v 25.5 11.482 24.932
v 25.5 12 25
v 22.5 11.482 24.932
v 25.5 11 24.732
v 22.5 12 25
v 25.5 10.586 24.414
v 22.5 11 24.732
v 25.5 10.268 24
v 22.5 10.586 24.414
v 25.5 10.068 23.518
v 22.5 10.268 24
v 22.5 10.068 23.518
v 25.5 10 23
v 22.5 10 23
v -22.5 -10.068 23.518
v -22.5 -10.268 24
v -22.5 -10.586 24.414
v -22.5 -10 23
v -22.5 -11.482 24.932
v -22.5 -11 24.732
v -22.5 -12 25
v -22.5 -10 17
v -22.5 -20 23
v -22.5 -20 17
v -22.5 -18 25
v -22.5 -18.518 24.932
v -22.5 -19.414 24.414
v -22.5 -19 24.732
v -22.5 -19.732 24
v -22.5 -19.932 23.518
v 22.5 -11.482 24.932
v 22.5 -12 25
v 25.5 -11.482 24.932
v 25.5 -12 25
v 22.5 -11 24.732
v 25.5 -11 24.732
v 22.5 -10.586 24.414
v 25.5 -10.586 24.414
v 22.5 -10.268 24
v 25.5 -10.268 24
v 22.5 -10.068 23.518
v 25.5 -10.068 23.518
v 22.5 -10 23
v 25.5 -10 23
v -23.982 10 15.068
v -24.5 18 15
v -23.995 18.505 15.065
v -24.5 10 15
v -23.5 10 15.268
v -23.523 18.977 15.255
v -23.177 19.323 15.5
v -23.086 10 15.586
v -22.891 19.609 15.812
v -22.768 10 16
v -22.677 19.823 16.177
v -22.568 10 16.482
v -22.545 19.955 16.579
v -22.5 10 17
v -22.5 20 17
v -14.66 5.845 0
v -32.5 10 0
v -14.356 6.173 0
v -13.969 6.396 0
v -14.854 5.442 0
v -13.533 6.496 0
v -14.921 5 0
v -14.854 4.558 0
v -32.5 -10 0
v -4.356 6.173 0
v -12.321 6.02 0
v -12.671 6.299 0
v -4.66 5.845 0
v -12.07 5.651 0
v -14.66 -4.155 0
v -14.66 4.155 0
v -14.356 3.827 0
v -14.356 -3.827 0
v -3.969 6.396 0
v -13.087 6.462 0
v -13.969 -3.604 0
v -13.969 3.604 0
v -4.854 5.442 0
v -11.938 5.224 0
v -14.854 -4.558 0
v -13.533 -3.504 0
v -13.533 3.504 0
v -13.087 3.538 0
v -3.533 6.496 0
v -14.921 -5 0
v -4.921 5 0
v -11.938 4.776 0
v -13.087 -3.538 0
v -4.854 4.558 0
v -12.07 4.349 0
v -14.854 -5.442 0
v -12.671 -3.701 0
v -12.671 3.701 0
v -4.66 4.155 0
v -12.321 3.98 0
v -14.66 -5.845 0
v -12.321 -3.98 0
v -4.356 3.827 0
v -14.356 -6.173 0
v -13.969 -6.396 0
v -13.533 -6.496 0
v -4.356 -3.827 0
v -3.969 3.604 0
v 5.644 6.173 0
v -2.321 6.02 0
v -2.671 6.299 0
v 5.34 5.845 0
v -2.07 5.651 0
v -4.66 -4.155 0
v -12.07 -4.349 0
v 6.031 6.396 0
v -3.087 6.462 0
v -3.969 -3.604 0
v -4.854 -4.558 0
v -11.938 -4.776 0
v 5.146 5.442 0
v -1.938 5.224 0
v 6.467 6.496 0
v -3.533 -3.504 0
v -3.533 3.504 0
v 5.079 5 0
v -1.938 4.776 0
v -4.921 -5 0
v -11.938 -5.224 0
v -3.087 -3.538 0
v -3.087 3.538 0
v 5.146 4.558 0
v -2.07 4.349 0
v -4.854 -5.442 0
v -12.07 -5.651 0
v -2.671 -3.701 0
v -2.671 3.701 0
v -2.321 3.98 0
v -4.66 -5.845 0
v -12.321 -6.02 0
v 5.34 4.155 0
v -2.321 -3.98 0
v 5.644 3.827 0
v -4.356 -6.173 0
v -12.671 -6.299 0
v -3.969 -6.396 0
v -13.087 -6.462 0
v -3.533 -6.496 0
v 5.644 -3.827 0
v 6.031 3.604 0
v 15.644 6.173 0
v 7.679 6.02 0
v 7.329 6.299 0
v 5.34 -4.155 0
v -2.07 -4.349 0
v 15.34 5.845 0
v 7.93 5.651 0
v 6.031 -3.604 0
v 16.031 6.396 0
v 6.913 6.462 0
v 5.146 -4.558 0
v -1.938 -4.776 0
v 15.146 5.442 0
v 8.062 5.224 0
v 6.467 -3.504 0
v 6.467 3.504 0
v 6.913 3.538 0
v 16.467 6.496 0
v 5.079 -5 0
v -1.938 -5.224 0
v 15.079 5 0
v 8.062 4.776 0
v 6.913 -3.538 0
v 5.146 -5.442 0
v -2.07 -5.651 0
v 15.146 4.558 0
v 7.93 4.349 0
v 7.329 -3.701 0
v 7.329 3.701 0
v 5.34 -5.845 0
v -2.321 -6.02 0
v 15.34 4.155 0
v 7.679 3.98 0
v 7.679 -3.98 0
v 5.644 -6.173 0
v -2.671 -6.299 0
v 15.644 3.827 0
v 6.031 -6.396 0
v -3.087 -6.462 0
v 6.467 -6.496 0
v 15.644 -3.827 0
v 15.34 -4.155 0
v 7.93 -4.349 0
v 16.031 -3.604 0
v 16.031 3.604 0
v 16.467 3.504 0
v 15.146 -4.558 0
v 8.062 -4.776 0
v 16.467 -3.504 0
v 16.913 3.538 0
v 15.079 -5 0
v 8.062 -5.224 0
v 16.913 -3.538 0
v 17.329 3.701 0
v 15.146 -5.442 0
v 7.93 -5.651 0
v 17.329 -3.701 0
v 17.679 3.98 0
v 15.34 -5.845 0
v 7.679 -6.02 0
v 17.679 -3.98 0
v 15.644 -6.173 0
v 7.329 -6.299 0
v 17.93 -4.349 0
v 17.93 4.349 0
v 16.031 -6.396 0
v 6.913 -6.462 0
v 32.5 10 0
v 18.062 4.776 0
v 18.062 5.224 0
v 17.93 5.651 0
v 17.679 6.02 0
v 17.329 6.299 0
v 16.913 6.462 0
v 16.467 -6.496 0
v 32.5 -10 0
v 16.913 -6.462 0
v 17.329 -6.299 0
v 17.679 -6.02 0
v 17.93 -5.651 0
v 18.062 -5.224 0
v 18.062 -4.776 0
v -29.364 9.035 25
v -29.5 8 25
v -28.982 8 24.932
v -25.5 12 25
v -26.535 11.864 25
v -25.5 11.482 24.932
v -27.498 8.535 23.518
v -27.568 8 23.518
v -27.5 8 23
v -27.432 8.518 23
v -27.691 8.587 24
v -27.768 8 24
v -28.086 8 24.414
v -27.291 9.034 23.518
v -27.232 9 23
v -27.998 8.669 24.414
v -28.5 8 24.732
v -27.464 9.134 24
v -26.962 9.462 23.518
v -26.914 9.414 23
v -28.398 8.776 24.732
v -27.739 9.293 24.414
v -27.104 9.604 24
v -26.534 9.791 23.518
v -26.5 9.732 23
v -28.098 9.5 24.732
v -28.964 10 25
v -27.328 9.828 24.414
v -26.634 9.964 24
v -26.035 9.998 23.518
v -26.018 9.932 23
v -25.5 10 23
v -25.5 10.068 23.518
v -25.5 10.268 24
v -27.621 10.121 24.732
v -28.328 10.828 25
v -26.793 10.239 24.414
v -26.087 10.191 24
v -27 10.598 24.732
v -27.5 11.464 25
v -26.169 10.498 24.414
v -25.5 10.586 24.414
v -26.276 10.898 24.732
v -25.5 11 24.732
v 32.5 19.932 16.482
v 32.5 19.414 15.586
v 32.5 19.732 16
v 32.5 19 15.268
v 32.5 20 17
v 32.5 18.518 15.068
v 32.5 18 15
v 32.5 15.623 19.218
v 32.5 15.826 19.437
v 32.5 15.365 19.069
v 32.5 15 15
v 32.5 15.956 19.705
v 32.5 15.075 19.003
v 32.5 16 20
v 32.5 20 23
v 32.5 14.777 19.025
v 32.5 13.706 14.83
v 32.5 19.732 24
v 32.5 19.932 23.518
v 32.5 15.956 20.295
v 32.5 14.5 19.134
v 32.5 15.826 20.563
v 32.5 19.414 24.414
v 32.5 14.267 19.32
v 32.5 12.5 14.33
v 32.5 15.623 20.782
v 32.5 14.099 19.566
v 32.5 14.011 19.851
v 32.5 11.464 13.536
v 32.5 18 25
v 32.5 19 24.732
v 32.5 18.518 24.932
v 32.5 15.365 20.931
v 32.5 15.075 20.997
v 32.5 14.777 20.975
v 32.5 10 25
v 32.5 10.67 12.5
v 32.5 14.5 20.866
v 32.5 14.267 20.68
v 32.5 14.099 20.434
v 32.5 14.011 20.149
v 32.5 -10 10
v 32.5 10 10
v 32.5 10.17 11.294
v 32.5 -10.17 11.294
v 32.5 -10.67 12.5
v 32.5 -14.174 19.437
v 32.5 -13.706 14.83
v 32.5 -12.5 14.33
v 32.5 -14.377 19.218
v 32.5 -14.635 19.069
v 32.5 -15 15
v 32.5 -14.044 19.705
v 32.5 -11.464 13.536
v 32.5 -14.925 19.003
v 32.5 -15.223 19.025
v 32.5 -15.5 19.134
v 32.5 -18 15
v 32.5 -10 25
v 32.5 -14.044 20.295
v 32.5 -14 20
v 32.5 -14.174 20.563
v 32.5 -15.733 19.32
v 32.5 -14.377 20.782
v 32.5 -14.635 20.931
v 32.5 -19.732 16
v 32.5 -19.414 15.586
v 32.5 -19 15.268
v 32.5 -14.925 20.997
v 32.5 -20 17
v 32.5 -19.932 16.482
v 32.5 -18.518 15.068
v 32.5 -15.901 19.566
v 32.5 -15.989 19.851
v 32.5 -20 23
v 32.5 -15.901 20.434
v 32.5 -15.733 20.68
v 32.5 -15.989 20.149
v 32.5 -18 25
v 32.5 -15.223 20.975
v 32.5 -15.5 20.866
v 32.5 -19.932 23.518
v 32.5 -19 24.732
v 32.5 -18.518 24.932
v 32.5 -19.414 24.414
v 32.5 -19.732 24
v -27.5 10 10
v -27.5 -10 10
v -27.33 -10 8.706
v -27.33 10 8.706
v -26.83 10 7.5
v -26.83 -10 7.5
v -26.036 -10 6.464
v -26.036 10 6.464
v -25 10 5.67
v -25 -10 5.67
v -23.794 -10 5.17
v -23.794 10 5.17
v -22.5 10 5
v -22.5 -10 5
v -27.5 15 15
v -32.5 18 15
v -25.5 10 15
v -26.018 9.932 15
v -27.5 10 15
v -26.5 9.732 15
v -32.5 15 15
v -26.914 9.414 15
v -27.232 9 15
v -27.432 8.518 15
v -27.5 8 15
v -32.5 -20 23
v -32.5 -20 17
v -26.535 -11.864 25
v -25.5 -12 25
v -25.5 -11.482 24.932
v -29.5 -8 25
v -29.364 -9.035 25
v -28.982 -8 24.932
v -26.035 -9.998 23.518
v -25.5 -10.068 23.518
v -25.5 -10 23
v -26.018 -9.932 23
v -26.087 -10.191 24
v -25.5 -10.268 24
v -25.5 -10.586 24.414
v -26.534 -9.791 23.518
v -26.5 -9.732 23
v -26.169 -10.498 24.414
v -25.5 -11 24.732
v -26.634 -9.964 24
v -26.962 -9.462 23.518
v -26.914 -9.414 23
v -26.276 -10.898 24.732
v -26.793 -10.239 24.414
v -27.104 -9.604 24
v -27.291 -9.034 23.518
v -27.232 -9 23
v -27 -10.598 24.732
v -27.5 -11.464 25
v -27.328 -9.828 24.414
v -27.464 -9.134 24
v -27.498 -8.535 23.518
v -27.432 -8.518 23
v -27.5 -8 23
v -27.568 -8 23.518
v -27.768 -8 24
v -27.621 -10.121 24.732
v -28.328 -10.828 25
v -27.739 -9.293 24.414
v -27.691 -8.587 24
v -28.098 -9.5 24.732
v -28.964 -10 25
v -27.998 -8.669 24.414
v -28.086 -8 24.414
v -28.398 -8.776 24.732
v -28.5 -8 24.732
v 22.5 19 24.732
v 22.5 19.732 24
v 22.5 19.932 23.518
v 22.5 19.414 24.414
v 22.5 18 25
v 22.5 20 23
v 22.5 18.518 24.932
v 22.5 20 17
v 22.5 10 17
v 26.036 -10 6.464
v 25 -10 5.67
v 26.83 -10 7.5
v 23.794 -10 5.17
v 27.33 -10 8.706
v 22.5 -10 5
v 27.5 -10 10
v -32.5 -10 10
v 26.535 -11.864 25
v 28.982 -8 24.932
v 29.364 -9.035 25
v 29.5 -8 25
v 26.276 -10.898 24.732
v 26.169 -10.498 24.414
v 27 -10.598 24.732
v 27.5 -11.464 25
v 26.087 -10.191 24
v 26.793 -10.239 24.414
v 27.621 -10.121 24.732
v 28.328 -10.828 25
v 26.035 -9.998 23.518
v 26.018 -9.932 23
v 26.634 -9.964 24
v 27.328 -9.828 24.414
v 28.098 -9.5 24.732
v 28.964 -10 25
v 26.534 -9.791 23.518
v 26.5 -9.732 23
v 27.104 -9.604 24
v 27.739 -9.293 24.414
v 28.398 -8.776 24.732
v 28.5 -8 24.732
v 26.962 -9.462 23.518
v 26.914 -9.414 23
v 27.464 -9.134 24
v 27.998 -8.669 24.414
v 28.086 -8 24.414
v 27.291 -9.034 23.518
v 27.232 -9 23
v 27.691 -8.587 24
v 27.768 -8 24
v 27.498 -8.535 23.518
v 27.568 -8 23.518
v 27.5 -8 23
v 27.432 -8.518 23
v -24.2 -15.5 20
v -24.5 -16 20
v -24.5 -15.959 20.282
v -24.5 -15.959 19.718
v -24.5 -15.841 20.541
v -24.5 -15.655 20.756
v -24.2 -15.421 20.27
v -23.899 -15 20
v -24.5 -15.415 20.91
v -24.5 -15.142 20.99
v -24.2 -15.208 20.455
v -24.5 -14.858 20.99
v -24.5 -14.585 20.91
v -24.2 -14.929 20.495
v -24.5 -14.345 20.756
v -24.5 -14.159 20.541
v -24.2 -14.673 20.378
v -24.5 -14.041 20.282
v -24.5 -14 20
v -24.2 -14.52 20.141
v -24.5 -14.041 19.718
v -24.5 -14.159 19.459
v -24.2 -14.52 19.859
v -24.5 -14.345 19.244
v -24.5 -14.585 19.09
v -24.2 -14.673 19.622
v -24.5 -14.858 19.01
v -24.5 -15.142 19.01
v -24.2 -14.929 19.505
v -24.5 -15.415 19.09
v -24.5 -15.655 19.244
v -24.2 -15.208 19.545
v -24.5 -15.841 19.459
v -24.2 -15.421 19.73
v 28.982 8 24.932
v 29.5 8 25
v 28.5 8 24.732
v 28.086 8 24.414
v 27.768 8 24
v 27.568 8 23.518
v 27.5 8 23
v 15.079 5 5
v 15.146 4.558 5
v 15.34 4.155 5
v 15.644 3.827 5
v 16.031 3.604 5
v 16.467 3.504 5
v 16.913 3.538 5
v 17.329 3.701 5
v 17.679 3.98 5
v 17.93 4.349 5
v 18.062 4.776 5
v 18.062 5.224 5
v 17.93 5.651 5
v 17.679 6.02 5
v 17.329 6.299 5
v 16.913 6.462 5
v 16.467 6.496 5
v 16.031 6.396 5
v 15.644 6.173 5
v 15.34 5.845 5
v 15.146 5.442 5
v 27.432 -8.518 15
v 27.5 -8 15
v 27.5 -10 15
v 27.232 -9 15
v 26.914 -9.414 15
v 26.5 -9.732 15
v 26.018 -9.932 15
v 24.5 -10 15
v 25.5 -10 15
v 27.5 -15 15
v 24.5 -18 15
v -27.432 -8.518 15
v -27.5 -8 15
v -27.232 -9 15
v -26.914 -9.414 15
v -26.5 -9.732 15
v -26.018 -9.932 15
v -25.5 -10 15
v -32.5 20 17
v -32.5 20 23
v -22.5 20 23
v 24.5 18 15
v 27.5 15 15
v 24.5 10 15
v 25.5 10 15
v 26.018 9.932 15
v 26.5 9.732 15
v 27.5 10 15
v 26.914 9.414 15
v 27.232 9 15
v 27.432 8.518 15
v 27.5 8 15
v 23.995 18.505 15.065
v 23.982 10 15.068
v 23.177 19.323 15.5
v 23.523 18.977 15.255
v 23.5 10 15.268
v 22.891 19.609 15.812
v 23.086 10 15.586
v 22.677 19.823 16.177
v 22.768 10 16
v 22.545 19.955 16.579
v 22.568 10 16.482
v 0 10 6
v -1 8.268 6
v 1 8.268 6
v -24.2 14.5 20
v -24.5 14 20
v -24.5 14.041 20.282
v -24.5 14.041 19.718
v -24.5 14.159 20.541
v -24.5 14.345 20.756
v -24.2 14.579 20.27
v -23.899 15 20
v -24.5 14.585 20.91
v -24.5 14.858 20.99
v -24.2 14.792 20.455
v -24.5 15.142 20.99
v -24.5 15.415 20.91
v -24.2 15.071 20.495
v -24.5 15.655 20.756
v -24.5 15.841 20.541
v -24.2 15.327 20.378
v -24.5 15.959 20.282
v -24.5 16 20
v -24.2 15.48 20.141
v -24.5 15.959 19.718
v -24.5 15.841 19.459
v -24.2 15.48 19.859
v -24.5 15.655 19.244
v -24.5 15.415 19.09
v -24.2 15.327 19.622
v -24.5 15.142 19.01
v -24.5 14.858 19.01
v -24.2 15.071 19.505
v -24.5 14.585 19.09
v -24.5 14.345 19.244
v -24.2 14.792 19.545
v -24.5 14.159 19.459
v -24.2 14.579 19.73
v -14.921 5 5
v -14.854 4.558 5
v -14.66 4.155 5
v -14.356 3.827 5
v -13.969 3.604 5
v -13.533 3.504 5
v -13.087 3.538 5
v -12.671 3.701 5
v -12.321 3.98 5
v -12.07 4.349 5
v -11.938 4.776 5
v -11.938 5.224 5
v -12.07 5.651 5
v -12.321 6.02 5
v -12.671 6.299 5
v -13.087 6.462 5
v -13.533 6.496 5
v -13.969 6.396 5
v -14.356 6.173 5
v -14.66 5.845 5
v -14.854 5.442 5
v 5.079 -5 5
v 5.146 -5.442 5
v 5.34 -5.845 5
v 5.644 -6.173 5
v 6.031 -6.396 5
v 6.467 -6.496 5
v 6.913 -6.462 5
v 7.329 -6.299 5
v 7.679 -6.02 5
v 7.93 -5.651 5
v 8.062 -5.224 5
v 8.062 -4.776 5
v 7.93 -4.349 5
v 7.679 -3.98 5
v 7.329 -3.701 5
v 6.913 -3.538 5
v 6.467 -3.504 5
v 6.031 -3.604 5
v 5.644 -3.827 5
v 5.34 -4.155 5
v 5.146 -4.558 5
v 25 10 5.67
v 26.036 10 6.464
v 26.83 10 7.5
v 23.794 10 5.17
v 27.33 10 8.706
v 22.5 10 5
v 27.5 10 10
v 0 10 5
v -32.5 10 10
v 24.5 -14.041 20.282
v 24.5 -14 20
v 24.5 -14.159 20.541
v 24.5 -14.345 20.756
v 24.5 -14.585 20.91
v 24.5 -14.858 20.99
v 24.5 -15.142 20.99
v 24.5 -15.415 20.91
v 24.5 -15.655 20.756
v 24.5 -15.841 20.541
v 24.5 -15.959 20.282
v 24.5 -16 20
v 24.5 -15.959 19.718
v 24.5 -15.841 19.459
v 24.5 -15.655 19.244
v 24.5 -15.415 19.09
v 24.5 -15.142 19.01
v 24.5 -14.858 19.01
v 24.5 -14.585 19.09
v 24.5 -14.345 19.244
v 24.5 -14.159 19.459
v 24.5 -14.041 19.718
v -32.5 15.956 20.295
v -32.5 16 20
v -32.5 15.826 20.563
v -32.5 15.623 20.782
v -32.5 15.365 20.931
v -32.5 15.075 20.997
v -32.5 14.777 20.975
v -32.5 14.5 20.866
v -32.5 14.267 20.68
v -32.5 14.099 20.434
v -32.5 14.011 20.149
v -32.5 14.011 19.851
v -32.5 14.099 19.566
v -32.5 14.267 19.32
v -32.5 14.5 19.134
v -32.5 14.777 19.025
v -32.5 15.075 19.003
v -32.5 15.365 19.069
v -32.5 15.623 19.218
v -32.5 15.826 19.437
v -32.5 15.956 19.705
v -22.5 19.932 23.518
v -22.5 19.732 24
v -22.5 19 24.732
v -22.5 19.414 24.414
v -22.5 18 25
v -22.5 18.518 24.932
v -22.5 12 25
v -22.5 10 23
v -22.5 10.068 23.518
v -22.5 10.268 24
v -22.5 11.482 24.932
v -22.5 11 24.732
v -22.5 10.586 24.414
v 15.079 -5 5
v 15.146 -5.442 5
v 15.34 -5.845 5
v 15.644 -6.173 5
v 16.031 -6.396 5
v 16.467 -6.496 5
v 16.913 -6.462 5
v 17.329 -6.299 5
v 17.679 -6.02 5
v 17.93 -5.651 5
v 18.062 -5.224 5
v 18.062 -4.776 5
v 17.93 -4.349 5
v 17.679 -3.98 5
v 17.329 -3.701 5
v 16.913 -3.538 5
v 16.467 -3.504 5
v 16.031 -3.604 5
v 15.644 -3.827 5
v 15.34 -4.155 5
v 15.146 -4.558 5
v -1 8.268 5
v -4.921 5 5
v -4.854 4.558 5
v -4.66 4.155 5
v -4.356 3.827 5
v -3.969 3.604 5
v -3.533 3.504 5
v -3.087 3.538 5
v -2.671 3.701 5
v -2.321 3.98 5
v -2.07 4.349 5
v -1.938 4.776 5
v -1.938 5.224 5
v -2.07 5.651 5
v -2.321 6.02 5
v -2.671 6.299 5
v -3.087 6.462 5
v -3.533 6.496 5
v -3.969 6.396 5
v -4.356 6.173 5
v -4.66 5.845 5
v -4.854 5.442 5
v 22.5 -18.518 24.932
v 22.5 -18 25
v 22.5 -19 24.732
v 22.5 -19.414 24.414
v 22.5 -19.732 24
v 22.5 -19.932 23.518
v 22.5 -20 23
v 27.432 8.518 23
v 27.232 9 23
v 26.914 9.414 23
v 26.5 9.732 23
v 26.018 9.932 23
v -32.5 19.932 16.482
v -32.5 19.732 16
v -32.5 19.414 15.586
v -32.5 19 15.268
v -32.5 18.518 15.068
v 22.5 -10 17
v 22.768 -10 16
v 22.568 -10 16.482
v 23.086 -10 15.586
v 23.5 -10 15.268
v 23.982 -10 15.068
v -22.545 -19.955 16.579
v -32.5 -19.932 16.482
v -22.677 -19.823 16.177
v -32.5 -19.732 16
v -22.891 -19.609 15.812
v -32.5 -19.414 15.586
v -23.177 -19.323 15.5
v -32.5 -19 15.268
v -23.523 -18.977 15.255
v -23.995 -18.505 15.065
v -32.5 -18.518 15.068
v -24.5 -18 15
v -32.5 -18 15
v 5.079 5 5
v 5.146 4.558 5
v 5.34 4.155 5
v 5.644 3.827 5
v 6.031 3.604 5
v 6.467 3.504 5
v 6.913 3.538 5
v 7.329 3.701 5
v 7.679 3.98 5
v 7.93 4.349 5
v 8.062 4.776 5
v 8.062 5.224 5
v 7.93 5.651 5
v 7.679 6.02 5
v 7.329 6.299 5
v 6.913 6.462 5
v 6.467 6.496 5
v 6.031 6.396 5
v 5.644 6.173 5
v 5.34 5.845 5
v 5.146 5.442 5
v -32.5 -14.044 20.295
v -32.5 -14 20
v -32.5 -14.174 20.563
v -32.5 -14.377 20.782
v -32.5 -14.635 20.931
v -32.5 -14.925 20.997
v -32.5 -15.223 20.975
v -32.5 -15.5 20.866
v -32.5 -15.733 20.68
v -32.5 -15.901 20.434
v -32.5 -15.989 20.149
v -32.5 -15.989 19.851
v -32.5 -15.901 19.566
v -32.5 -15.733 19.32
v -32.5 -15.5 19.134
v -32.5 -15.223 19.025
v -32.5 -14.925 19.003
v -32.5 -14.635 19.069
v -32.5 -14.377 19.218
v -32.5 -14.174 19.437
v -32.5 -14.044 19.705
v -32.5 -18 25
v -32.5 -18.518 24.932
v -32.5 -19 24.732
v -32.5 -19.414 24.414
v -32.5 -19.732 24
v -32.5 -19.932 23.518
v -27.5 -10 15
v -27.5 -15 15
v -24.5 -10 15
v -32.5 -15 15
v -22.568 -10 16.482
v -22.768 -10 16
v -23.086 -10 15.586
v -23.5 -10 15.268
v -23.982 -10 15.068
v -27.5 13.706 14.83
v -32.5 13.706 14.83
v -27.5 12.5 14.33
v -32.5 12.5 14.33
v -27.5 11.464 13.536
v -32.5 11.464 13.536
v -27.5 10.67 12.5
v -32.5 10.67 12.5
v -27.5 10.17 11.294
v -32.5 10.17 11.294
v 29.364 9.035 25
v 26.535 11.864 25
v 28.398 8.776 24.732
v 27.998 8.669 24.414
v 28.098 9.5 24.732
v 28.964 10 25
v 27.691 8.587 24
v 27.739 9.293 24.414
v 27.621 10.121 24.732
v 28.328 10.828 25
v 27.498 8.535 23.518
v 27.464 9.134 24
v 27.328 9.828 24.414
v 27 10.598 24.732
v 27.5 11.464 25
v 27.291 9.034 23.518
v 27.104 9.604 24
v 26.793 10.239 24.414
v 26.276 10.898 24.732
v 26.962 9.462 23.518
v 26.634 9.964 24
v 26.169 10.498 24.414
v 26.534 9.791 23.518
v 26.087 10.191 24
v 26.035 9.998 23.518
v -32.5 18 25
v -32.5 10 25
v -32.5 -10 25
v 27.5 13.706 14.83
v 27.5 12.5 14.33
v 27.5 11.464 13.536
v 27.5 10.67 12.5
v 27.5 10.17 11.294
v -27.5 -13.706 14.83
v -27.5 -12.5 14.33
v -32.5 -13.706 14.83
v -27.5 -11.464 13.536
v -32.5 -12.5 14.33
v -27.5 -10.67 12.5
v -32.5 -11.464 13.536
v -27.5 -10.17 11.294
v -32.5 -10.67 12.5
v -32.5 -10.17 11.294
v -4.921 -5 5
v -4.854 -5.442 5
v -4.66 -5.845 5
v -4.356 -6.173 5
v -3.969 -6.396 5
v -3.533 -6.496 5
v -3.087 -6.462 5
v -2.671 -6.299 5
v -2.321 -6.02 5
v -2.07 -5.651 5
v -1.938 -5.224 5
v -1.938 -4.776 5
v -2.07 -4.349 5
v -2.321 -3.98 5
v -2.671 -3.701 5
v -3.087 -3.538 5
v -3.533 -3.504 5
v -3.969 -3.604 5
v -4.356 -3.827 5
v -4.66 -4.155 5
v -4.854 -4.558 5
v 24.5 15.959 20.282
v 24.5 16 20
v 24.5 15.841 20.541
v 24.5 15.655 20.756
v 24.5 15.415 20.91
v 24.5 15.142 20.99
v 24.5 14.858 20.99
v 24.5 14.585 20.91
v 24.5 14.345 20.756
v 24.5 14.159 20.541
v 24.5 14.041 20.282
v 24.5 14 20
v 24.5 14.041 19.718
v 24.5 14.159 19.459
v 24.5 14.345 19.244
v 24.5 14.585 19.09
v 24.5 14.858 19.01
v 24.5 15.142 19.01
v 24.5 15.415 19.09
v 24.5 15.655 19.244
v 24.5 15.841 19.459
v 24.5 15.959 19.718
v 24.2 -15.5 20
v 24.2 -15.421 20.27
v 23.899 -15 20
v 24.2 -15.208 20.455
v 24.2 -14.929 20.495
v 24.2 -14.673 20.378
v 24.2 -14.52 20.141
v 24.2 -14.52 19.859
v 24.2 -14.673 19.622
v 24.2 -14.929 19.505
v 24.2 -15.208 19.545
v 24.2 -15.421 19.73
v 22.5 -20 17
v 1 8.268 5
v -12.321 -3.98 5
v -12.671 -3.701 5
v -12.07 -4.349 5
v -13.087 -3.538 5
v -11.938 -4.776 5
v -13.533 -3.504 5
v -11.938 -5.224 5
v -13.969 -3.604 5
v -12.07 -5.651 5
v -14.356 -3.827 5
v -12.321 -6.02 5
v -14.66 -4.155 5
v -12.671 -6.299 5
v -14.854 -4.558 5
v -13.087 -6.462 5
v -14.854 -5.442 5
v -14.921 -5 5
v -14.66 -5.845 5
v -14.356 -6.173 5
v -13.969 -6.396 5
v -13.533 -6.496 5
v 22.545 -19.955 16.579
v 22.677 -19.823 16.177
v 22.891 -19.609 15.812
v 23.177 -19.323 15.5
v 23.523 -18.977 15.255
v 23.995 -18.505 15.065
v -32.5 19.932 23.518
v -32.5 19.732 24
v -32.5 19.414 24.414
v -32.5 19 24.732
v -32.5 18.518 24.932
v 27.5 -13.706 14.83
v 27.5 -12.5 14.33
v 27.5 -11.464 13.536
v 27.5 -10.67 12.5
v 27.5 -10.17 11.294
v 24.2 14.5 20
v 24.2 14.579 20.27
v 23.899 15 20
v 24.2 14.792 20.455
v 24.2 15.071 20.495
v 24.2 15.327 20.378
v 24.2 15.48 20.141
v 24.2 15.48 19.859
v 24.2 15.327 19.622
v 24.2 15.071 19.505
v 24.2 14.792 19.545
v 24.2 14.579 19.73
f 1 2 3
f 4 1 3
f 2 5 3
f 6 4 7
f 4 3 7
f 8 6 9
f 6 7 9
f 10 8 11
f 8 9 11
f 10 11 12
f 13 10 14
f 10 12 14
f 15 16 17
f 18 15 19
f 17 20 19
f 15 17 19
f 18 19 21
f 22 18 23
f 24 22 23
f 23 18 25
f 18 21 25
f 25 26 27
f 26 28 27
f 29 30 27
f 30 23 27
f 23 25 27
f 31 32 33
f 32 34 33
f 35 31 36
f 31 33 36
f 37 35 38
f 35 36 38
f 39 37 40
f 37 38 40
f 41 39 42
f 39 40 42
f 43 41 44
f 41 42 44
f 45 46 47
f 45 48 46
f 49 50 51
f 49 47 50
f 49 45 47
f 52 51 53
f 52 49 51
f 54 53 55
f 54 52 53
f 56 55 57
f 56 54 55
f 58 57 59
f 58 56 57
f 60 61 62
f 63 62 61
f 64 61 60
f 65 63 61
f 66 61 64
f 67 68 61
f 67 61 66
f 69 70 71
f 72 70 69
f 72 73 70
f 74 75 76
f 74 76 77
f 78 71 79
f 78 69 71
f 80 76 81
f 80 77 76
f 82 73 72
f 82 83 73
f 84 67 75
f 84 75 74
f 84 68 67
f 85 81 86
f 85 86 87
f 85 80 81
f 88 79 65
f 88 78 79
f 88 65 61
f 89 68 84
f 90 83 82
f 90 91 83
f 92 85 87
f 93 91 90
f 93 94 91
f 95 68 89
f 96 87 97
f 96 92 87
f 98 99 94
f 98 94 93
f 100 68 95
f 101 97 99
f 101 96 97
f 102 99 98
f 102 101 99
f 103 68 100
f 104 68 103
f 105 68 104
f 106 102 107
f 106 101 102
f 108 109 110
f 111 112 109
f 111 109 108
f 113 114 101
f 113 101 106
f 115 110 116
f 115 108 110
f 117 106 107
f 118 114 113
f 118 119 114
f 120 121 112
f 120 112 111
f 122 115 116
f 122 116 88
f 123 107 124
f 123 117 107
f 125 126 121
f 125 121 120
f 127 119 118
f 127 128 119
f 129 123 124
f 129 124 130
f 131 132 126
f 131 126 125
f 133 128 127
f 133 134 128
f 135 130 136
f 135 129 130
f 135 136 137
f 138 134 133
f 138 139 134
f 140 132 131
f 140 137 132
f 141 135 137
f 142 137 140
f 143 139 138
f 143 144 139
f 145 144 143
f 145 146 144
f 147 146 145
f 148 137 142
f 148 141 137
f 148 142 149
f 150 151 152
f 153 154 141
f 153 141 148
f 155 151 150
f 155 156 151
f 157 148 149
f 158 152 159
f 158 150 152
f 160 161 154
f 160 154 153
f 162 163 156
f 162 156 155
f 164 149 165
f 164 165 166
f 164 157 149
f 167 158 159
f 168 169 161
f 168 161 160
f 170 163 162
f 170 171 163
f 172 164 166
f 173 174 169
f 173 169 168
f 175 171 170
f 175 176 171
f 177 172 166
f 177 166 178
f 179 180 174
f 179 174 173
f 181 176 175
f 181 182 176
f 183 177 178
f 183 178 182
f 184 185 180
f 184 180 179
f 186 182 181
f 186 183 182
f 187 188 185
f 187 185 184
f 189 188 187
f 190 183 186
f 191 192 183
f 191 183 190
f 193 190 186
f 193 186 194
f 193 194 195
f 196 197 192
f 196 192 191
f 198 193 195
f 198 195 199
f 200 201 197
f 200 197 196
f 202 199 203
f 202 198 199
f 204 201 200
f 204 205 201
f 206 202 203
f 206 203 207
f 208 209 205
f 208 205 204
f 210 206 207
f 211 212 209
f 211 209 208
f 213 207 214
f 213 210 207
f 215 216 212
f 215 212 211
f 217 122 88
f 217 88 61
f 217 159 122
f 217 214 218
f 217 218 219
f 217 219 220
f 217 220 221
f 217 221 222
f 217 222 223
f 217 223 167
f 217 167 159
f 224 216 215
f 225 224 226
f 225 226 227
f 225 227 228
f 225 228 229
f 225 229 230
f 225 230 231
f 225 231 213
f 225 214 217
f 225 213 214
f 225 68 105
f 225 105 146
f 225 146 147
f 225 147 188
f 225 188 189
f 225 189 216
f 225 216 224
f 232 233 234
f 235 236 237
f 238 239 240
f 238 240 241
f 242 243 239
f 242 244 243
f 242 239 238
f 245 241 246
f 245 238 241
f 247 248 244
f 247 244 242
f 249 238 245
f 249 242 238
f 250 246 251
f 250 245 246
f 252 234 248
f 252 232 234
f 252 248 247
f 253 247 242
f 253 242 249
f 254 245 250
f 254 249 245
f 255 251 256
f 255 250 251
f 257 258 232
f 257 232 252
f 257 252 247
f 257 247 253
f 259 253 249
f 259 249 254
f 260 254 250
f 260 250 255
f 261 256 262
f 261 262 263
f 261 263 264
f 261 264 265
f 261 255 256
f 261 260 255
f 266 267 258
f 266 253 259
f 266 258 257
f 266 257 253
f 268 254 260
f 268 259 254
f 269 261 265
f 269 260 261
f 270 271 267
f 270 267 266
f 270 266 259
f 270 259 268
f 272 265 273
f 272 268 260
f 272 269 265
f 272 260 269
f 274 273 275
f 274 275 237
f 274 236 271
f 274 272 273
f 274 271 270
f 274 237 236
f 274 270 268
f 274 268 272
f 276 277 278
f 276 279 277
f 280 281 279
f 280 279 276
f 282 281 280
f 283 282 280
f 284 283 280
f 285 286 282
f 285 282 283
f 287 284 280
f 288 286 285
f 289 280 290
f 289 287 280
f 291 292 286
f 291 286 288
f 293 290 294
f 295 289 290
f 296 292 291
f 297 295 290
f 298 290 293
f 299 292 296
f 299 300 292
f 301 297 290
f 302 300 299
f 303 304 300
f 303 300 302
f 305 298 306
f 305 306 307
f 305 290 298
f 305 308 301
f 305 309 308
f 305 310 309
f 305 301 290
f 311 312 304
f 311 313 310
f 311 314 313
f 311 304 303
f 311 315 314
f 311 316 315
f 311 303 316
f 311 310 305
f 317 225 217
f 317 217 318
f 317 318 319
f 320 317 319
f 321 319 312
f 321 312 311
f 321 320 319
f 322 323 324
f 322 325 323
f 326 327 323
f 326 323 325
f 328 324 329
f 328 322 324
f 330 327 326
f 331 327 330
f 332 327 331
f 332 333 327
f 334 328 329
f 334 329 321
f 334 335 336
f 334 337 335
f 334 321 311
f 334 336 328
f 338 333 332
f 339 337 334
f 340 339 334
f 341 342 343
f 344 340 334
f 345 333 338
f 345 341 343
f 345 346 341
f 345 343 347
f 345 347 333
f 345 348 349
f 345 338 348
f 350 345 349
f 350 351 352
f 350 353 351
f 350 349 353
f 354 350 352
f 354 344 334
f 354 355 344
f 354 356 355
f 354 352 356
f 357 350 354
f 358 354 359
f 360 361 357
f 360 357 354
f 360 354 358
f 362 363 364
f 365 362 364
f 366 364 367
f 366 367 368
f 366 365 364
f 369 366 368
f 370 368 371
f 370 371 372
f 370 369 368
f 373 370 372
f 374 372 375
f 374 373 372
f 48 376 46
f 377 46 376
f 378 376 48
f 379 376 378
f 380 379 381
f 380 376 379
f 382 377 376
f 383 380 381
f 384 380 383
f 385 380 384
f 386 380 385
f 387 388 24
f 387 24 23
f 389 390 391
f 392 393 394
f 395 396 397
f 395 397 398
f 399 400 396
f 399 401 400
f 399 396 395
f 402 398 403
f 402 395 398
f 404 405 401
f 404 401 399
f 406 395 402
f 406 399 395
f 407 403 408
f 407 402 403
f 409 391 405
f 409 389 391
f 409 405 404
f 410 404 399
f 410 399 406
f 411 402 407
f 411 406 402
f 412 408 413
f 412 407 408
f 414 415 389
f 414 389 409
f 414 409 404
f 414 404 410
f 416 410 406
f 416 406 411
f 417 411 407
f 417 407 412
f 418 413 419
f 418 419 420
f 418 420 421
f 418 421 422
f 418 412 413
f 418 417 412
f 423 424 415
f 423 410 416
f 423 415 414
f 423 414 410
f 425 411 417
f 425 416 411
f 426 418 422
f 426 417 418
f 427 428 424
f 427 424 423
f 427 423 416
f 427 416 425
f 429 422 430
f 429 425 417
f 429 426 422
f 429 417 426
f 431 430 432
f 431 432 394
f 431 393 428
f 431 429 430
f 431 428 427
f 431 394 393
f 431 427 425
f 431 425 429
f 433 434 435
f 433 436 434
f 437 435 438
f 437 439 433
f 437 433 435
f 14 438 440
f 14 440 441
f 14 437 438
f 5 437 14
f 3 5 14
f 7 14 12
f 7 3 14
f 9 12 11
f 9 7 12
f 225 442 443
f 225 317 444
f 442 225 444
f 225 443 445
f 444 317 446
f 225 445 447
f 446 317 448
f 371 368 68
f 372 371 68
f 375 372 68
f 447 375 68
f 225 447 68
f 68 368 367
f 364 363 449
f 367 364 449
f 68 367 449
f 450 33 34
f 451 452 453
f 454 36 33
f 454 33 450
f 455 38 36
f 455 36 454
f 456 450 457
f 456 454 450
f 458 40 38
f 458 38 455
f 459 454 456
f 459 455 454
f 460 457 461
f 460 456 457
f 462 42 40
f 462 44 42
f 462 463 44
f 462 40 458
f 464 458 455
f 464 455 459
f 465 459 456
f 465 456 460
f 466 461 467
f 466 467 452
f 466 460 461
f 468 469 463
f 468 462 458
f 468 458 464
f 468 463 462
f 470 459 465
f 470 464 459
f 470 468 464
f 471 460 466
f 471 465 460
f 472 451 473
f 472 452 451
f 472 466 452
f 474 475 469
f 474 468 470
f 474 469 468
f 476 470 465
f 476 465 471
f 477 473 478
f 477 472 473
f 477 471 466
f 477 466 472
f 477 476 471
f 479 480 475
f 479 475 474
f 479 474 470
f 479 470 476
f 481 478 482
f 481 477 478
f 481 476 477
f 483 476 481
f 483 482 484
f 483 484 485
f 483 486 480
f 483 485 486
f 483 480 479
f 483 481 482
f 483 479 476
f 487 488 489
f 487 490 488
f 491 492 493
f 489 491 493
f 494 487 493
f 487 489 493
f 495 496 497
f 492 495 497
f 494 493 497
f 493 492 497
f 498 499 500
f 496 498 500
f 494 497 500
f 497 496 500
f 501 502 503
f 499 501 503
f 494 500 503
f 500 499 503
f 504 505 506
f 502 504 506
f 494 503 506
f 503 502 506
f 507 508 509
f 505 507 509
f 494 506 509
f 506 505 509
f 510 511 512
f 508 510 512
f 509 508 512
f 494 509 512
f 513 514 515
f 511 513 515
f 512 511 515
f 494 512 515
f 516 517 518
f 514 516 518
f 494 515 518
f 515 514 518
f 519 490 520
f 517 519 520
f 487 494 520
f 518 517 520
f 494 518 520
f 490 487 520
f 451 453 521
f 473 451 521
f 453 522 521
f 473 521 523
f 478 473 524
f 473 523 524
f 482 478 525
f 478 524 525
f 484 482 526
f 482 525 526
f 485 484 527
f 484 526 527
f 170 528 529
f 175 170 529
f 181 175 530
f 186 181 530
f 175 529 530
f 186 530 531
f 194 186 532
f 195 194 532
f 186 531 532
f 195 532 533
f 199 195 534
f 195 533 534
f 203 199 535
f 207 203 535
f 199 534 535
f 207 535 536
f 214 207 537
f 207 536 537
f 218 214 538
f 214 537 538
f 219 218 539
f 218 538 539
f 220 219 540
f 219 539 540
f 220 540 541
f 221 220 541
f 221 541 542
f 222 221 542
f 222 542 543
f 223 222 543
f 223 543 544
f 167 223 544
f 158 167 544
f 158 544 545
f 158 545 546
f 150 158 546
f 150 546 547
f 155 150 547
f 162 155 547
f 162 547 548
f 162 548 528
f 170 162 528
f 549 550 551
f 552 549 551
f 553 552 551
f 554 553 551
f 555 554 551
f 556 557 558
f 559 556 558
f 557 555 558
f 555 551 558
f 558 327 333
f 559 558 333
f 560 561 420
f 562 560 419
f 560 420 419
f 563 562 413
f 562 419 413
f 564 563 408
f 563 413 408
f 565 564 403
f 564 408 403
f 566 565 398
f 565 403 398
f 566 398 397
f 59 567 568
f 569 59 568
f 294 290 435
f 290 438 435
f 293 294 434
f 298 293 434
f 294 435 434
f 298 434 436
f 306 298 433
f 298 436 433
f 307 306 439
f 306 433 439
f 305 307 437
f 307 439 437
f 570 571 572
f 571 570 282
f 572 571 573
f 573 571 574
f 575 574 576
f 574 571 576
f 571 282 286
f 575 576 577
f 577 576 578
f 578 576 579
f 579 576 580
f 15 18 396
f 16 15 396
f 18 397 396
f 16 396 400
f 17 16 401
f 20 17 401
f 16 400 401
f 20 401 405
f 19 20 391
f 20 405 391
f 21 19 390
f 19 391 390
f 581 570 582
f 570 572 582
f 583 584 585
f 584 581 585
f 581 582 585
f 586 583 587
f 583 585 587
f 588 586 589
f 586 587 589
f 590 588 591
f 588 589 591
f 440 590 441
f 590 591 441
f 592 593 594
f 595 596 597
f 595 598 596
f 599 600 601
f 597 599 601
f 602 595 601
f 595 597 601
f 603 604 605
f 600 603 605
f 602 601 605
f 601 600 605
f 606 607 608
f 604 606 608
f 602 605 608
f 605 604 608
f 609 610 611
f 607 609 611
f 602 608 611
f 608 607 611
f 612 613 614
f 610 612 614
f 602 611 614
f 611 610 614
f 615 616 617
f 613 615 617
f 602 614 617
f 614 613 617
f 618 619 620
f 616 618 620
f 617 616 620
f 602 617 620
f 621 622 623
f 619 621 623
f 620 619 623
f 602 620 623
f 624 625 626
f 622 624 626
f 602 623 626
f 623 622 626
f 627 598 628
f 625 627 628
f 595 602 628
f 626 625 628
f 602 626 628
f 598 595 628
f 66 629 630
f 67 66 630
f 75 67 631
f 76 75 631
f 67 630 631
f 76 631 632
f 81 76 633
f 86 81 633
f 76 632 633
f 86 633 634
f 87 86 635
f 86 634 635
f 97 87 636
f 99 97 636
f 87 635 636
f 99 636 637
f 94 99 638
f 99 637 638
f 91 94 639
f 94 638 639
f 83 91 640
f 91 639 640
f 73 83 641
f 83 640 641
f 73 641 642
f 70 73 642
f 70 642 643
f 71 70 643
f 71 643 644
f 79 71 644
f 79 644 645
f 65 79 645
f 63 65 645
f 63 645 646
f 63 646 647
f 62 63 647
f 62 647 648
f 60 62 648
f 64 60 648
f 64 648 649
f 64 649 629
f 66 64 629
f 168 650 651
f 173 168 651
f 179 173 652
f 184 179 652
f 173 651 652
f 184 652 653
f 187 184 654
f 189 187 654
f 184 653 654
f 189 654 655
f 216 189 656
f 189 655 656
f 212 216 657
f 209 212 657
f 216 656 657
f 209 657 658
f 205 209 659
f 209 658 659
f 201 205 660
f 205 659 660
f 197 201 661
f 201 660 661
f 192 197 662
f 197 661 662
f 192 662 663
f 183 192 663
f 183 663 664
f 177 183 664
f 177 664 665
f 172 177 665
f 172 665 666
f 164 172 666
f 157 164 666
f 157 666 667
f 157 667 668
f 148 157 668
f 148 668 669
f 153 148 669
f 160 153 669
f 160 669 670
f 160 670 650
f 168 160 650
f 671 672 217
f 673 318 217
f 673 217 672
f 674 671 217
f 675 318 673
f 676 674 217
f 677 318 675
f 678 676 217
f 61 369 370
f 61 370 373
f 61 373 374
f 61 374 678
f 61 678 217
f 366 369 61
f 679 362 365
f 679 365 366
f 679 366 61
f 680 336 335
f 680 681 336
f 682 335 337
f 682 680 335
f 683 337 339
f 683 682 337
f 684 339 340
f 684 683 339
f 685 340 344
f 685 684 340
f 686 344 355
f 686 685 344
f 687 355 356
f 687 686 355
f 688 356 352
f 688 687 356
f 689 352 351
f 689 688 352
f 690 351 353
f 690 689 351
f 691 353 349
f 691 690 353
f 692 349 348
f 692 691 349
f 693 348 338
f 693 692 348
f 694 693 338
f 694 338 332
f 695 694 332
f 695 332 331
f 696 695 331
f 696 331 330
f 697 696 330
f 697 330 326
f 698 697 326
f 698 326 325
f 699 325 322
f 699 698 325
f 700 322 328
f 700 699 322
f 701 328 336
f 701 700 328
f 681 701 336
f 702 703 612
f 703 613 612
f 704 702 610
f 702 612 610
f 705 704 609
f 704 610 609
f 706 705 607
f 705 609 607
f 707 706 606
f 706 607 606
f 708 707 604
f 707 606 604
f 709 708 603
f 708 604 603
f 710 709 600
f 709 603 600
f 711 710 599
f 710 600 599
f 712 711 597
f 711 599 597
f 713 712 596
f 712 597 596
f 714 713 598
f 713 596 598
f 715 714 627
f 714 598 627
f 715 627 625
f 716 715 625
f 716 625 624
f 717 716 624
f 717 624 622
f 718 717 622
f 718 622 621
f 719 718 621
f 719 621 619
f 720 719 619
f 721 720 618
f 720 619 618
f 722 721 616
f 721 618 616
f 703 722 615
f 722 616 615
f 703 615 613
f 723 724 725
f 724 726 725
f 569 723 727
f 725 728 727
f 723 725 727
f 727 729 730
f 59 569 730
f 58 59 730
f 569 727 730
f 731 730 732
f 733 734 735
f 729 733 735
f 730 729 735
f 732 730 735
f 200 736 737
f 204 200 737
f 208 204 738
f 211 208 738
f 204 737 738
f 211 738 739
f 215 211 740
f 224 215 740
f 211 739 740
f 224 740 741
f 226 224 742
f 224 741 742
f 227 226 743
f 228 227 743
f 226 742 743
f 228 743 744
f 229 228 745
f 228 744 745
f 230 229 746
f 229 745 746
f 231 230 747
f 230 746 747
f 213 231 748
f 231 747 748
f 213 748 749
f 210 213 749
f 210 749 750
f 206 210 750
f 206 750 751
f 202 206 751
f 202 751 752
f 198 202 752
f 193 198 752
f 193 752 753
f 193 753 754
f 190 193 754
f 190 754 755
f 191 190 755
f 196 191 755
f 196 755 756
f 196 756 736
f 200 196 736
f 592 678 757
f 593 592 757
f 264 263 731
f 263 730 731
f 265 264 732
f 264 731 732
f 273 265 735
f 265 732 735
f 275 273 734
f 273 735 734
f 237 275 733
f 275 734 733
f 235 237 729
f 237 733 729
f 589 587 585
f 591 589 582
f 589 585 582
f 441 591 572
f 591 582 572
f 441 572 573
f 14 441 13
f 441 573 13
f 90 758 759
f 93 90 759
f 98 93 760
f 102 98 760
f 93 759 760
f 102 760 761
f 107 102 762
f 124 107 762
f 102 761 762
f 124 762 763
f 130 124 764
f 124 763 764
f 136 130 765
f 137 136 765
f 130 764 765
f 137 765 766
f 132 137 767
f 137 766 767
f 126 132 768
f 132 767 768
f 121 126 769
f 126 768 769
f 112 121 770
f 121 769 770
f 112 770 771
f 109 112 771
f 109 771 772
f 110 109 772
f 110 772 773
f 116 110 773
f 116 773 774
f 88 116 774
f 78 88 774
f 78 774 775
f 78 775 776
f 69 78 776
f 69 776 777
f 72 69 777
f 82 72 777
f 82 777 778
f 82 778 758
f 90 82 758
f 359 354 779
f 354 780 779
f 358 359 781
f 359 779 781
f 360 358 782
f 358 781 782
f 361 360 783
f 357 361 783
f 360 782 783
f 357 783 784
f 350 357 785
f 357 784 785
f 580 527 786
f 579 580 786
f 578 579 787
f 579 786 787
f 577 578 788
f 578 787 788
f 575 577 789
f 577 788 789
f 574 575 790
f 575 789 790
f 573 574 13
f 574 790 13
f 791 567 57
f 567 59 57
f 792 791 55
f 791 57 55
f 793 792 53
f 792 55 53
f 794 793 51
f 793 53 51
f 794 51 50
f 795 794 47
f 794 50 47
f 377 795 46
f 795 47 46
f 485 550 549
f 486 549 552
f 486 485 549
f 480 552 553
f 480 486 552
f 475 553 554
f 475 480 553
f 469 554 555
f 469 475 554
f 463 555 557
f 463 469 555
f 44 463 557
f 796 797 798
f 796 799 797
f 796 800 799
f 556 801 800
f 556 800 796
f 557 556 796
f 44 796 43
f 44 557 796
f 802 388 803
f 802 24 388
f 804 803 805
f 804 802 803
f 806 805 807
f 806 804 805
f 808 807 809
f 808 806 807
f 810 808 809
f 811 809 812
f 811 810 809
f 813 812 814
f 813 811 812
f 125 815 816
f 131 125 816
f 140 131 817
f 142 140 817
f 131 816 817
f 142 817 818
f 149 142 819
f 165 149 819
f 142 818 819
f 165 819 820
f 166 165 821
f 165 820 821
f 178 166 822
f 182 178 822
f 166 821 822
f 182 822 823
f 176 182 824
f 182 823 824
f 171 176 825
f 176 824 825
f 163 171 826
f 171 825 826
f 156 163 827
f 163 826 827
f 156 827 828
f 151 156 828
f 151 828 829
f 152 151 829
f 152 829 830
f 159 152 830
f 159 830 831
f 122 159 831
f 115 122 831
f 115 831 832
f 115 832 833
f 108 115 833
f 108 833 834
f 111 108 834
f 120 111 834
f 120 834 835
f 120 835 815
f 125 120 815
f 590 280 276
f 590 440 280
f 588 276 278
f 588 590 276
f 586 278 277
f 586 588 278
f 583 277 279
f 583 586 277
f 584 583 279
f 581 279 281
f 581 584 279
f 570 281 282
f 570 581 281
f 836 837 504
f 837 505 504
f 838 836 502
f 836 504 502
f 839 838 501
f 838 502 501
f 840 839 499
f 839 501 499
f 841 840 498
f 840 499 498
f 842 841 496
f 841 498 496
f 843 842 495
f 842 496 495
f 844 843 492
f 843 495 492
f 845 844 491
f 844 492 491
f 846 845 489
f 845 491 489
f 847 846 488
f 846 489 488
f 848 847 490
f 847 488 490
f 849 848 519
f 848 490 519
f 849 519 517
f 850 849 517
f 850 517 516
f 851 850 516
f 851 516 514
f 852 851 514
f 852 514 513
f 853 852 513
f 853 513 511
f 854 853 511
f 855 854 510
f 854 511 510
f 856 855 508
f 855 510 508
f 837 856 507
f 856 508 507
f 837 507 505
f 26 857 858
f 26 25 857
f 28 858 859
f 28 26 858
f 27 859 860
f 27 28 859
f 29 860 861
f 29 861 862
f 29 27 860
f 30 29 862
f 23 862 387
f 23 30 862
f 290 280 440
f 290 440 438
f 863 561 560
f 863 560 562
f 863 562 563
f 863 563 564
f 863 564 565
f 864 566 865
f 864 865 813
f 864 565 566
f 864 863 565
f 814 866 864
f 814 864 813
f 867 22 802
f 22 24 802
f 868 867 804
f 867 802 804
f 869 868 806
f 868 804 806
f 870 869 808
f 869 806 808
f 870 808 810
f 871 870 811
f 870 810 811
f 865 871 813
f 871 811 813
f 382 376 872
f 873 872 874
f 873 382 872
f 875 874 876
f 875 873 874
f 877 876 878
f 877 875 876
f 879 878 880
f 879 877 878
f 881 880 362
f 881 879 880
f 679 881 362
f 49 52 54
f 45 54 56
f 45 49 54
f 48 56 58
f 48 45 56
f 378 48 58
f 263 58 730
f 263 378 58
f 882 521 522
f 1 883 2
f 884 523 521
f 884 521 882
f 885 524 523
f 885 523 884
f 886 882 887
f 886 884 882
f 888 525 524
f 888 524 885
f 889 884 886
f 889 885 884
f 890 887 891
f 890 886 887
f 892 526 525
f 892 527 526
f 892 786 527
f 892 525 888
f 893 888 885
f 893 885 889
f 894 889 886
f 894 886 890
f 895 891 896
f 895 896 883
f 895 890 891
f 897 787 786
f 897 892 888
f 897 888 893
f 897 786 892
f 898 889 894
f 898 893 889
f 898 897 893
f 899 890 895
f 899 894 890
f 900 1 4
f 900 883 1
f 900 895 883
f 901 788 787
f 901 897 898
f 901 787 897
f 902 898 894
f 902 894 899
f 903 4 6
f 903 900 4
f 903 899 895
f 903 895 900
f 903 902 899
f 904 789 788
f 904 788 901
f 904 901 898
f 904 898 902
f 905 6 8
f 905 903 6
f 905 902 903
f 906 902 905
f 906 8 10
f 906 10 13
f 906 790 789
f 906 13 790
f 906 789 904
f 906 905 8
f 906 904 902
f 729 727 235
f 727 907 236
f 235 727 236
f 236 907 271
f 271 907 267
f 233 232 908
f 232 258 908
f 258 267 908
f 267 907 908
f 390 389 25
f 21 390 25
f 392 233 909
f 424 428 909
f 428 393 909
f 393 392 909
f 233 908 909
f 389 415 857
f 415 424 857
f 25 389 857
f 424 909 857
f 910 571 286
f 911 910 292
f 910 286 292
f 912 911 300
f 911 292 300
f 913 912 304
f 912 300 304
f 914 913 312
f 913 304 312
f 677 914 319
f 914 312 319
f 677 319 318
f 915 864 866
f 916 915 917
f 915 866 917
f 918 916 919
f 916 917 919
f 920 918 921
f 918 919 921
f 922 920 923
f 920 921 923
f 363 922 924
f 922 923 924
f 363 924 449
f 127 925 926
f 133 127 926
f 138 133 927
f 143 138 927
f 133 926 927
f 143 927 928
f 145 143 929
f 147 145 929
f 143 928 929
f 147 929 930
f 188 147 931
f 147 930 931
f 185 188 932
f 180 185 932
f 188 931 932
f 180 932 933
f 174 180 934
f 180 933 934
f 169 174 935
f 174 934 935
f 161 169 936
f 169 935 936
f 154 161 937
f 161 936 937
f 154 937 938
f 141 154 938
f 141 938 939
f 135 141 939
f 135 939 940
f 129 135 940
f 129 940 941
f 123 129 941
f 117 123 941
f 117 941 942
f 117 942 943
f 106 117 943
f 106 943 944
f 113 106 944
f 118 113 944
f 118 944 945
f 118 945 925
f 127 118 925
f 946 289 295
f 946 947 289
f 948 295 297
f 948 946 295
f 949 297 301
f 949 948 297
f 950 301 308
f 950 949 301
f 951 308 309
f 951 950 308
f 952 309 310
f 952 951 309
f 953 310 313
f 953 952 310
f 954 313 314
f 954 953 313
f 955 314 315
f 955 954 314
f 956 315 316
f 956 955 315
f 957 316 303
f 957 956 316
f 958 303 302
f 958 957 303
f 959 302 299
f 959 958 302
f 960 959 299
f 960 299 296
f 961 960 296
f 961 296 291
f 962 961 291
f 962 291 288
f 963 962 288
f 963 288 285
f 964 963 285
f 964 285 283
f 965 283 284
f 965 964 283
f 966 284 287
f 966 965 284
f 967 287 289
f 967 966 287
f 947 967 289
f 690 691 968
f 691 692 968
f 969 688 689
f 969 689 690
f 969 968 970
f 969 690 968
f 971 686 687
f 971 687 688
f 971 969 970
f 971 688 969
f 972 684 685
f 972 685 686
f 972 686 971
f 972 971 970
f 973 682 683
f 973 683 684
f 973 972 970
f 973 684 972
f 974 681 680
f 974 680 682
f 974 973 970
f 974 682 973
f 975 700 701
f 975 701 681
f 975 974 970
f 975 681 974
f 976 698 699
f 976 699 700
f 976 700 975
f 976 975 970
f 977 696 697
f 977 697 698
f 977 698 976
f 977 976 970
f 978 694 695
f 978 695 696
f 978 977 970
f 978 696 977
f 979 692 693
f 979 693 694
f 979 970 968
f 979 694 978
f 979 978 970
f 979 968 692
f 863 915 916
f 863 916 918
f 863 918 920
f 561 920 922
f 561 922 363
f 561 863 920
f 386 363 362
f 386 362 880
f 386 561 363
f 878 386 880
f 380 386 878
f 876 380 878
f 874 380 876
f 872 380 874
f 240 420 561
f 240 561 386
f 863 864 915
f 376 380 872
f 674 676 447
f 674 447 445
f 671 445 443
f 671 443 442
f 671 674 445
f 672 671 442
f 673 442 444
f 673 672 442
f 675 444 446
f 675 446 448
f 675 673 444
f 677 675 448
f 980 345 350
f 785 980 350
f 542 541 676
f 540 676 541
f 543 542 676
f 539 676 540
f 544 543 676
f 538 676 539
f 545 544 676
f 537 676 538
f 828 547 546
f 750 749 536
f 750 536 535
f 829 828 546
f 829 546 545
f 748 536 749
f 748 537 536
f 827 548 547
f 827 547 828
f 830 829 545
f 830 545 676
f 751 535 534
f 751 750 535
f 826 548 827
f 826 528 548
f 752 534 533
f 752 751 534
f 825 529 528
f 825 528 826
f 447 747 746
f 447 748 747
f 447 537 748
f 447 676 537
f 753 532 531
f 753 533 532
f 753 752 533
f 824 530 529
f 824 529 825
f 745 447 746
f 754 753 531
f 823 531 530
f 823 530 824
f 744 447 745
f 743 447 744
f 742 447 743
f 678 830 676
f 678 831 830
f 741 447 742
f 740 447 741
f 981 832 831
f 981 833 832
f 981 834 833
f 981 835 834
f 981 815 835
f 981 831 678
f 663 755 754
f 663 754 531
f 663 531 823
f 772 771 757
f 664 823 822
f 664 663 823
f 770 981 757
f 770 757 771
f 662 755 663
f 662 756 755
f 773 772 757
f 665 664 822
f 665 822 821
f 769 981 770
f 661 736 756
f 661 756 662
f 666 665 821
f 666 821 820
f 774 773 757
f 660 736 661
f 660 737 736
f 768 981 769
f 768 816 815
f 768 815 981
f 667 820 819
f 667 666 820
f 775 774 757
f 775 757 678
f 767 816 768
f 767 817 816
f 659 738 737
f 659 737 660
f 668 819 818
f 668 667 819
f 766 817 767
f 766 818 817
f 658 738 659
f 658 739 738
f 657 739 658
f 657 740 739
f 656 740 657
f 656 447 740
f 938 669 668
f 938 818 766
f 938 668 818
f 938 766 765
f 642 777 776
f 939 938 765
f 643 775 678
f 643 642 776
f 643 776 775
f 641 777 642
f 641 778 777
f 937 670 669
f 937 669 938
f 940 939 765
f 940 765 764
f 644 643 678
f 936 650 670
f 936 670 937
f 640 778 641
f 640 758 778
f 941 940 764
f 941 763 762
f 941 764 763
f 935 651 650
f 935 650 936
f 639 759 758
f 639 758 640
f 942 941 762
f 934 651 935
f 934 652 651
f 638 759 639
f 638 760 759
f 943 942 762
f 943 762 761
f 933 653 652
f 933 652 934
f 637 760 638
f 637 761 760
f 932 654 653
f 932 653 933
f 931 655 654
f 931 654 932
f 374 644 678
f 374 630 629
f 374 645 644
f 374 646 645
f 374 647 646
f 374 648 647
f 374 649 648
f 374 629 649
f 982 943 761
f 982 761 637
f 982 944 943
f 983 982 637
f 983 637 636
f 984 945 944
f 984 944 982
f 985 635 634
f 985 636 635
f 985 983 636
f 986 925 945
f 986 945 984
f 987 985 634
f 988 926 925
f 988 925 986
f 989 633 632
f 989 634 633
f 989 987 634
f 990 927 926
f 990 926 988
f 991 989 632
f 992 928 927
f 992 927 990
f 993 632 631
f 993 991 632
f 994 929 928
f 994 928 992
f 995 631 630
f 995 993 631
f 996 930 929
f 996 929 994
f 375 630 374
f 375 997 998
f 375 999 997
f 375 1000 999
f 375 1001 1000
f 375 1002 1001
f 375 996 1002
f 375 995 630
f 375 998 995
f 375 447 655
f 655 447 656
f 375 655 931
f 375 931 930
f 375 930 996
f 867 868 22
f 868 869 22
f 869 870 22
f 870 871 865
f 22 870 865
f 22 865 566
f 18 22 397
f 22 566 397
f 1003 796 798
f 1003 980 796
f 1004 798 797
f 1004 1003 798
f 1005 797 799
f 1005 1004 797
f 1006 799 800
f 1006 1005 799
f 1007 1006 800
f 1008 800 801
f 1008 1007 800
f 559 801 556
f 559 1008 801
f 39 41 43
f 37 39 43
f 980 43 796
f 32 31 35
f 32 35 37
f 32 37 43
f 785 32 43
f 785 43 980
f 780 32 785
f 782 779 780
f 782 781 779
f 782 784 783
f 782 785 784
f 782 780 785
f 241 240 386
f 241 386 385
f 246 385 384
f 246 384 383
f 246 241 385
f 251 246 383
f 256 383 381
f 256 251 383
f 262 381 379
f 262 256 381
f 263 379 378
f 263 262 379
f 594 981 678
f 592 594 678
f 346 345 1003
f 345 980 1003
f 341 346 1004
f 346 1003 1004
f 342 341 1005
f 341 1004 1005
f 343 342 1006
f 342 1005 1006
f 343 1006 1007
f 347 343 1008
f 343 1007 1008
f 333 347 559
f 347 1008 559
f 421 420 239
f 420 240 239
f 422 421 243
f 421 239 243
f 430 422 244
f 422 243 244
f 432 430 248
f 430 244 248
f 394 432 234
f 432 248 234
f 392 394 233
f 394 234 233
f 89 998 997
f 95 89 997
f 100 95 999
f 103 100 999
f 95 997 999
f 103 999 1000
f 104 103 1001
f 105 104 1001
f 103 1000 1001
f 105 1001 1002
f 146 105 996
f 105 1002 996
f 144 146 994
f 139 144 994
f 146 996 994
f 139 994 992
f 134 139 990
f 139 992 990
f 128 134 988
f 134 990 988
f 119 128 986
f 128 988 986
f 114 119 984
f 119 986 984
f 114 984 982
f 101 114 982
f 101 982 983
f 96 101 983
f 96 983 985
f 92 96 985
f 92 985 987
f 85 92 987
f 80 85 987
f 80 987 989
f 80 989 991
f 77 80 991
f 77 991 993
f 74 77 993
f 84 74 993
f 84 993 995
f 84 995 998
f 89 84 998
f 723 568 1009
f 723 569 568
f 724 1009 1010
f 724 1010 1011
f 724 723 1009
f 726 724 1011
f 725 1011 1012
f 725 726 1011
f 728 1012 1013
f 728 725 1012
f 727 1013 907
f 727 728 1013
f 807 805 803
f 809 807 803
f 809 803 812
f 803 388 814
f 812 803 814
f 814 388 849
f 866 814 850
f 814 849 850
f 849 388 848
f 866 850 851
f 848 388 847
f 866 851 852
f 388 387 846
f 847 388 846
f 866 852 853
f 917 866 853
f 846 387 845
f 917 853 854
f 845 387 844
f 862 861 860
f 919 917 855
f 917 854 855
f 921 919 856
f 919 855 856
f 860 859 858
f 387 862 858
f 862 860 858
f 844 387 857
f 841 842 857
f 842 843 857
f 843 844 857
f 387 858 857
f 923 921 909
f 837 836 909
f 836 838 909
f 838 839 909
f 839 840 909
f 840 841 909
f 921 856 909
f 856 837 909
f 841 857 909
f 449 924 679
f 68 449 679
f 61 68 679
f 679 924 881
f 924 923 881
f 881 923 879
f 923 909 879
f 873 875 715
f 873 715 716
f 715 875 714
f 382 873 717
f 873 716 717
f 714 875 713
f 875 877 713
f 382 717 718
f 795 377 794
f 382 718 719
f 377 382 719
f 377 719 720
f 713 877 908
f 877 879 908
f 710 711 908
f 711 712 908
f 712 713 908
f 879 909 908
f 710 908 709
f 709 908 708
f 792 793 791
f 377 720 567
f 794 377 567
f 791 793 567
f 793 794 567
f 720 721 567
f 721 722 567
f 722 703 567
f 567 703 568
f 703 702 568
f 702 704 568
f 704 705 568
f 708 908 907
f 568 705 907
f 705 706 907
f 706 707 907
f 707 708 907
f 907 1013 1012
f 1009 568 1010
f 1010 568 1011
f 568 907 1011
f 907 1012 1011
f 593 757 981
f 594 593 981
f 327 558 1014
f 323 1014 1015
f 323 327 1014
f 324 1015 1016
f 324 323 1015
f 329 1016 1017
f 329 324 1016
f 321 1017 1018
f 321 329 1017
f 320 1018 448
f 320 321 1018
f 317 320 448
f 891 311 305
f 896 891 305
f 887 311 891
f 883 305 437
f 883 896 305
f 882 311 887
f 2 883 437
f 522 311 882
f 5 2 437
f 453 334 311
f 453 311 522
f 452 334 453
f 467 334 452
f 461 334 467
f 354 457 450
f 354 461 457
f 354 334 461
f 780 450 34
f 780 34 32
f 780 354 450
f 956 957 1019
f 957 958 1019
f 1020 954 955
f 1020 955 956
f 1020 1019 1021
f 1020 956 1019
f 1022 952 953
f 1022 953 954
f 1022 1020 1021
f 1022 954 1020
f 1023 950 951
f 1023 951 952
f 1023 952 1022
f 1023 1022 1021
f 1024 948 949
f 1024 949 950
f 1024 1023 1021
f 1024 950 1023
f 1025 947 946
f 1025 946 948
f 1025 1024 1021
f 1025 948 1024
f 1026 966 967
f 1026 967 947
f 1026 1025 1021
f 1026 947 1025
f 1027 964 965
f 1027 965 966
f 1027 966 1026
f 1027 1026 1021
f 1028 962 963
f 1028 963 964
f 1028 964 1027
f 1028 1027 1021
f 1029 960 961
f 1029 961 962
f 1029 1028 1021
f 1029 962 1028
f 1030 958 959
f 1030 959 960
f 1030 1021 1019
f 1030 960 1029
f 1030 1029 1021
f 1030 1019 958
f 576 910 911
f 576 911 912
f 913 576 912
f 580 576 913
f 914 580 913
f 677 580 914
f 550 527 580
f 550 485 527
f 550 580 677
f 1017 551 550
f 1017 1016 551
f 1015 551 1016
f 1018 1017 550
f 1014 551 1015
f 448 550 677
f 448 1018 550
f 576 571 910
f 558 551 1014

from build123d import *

# Parameters (mm, degrees)
F1_DEPTH    = 10
F4_DEPTH    = 1
F5_W        = 10
F5_H        = 10.0000003353
F6_DEPTH    = 10
F7_D        = 2
F7_DEPTH    = 8
F7_TIP      = 0.600860619
F8_R        = 2
F9_T1_DEPTH = 5
F9_T3_DEPTH = 20
F10_R       = 2
F12_D       = 3
F13_R       = 2


# Not quite as in the source:
# - a fillet or chamfer that OpenCascade refuses, or shapes differently, is made with other operations: its cross-section is extruded or revolved along the edge and cut away or added


with BuildPart() as f1:
    # F0 (on Front) → F1 (new body, symmetric)
    with BuildSketch(Plane.XZ):
        Polygon((-27.5, 25), (-32.5, 25), (-32.5, 0), (32.5, 0), (32.5, 25), (27.5, 25), (27.5, 5), (-27.5, 5), align=None)
    extrude(amount=F1_DEPTH, both=True)

    # F3 (on face) → F4 (join)
    with BuildSketch(Plane.XY.offset(5)):
        Polygon((1, 8.2679491924), (0, 10), (-1, 8.2679491924), align=None)
    extrude(amount=F4_DEPTH)

    # F5 (on face) → F6 (join)
    with BuildSketch(Plane(origin=(-32.5, 0, 0), x_dir=(0, -1, 0), z_dir=(-1, 0, 0))):
        with Locations((-15, 19.9999998324)):
            Rectangle(F5_W, F5_H)
        with Locations((15, 19.9999998324)):
            Rectangle(F5_W, F5_H)
    extrude(amount=-F6_DEPTH)

    # F7
    with Locations(Plane(origin=(-32.5, 0, 0), x_dir=(0, -1, 0), z_dir=(-1, 0, 0))):
        with Locations((-15, 19.9999998324), (15, 19.9999998324)):
            Hole(F7_D / 2, depth=F7_DEPTH)
            with Locations((0, 0, -(F7_DEPTH + F7_TIP / 2))):  # 118° drill point
                Cone(0, F7_D / 2, F7_TIP, mode=Mode.SUBTRACT)

    # F8
    f8_edges = [f1.edges().sort_by_distance(p)[0] for p in [
        (-27.5, -20, 25),
        (-27.5, 20, 25),
        (-27.5, 20, 15),
        (-22.5, 15, 15),
        (-22.5, -15, 15),
        (-27.5, -20, 15),
    ]]
    fillet(f8_edges, radius=F8_R)

    # F9: fillet of radius 5 on 4 edges, made by hand

    # F9_s2 → F9_t1 (join)
    with BuildSketch(Plane.YZ.offset(-32.5)):
        with BuildLine():
            ThreePointArc((-15, 14.9999996647), (-11.4644660941, 13.5355335707), (-10, 9.9999996647))
            Line((-10, 9.9999996647), (-10, 14.9999996647))
            Line((-10, 14.9999996647), (-15, 14.9999996647))
        make_face()
        with BuildLine():
            ThreePointArc((15, 14.9999996647), (11.4644660941, 13.5355335707), (10, 9.9999996647))
            Line((10, 9.9999996647), (10, 14.9999996647))
            Line((10, 14.9999996647), (15, 14.9999996647))
        make_face()
    extrude(amount=F9_T1_DEPTH)

    # F9_s4 → F9_t3 (join)
    with BuildSketch(Plane.XZ.offset(-10)):
        with BuildLine():
            ThreePointArc((-27.5, 10), (-26.0355339059, 6.4644660941), (-22.5, 5))
            Line((-22.5, 5), (-27.5, 5))
            Line((-27.5, 5), (-27.5, 10))
        make_face()
        with BuildLine():
            ThreePointArc((22.5, 5), (26.0355339059, 6.4644660941), (27.5, 10))
            Line((27.5, 10), (27.5, 5))
            Line((27.5, 5), (22.5, 5))
        make_face()
    extrude(amount=F9_T3_DEPTH)

    # F10
    f10_edges = [f1.edges().sort_by_distance(p)[0] for p in [
        (-27.5, 10, 20),
        (-27.5, -10, 20),
    ]]
    fillet(f10_edges, radius=F10_R)

    # F11: F1 across plane


with BuildPart() as f1_1:
    add(f1.part)
    add(f1.part.mirror(Plane.YZ))

    # F12 (through all)
    with Locations(Plane(origin=(0, 0, 0), x_dir=(1, 0, 0), z_dir=(0, 0, -1))):
        with Locations((-13.4210362619, 5.0000001118), (-3.4210362619, 5.0000001118), (6.5789637381, 5.0000001118), (16.5789637381, 5.0000001118), (-13.4210362619, -4.9999998882), (-3.4210362619, -4.9999998882), (6.5789637381, -4.9999998882), (16.5789637381, -4.9999998882)):
            Hole(F12_D / 2)

    # F13
    f13_edges = [f1_1.edges().sort_by_distance(p)[0] for p in [
        (-27.5, 0, 25),
        (27.5, 0, 25),
        (-24, -10, 25),
        (-26.914214, -9.414214, 25),
        (-26.914214, 9.414214, 25),
        (-24, 10, 25),
        (24, 10, 25),
        (26.914214, 9.414214, 25),
        (26.914214, -9.414214, 25),
        (24, -10, 25),
    ]]
    fillet(f13_edges, radius=F13_R)


solid = f1_1.part
